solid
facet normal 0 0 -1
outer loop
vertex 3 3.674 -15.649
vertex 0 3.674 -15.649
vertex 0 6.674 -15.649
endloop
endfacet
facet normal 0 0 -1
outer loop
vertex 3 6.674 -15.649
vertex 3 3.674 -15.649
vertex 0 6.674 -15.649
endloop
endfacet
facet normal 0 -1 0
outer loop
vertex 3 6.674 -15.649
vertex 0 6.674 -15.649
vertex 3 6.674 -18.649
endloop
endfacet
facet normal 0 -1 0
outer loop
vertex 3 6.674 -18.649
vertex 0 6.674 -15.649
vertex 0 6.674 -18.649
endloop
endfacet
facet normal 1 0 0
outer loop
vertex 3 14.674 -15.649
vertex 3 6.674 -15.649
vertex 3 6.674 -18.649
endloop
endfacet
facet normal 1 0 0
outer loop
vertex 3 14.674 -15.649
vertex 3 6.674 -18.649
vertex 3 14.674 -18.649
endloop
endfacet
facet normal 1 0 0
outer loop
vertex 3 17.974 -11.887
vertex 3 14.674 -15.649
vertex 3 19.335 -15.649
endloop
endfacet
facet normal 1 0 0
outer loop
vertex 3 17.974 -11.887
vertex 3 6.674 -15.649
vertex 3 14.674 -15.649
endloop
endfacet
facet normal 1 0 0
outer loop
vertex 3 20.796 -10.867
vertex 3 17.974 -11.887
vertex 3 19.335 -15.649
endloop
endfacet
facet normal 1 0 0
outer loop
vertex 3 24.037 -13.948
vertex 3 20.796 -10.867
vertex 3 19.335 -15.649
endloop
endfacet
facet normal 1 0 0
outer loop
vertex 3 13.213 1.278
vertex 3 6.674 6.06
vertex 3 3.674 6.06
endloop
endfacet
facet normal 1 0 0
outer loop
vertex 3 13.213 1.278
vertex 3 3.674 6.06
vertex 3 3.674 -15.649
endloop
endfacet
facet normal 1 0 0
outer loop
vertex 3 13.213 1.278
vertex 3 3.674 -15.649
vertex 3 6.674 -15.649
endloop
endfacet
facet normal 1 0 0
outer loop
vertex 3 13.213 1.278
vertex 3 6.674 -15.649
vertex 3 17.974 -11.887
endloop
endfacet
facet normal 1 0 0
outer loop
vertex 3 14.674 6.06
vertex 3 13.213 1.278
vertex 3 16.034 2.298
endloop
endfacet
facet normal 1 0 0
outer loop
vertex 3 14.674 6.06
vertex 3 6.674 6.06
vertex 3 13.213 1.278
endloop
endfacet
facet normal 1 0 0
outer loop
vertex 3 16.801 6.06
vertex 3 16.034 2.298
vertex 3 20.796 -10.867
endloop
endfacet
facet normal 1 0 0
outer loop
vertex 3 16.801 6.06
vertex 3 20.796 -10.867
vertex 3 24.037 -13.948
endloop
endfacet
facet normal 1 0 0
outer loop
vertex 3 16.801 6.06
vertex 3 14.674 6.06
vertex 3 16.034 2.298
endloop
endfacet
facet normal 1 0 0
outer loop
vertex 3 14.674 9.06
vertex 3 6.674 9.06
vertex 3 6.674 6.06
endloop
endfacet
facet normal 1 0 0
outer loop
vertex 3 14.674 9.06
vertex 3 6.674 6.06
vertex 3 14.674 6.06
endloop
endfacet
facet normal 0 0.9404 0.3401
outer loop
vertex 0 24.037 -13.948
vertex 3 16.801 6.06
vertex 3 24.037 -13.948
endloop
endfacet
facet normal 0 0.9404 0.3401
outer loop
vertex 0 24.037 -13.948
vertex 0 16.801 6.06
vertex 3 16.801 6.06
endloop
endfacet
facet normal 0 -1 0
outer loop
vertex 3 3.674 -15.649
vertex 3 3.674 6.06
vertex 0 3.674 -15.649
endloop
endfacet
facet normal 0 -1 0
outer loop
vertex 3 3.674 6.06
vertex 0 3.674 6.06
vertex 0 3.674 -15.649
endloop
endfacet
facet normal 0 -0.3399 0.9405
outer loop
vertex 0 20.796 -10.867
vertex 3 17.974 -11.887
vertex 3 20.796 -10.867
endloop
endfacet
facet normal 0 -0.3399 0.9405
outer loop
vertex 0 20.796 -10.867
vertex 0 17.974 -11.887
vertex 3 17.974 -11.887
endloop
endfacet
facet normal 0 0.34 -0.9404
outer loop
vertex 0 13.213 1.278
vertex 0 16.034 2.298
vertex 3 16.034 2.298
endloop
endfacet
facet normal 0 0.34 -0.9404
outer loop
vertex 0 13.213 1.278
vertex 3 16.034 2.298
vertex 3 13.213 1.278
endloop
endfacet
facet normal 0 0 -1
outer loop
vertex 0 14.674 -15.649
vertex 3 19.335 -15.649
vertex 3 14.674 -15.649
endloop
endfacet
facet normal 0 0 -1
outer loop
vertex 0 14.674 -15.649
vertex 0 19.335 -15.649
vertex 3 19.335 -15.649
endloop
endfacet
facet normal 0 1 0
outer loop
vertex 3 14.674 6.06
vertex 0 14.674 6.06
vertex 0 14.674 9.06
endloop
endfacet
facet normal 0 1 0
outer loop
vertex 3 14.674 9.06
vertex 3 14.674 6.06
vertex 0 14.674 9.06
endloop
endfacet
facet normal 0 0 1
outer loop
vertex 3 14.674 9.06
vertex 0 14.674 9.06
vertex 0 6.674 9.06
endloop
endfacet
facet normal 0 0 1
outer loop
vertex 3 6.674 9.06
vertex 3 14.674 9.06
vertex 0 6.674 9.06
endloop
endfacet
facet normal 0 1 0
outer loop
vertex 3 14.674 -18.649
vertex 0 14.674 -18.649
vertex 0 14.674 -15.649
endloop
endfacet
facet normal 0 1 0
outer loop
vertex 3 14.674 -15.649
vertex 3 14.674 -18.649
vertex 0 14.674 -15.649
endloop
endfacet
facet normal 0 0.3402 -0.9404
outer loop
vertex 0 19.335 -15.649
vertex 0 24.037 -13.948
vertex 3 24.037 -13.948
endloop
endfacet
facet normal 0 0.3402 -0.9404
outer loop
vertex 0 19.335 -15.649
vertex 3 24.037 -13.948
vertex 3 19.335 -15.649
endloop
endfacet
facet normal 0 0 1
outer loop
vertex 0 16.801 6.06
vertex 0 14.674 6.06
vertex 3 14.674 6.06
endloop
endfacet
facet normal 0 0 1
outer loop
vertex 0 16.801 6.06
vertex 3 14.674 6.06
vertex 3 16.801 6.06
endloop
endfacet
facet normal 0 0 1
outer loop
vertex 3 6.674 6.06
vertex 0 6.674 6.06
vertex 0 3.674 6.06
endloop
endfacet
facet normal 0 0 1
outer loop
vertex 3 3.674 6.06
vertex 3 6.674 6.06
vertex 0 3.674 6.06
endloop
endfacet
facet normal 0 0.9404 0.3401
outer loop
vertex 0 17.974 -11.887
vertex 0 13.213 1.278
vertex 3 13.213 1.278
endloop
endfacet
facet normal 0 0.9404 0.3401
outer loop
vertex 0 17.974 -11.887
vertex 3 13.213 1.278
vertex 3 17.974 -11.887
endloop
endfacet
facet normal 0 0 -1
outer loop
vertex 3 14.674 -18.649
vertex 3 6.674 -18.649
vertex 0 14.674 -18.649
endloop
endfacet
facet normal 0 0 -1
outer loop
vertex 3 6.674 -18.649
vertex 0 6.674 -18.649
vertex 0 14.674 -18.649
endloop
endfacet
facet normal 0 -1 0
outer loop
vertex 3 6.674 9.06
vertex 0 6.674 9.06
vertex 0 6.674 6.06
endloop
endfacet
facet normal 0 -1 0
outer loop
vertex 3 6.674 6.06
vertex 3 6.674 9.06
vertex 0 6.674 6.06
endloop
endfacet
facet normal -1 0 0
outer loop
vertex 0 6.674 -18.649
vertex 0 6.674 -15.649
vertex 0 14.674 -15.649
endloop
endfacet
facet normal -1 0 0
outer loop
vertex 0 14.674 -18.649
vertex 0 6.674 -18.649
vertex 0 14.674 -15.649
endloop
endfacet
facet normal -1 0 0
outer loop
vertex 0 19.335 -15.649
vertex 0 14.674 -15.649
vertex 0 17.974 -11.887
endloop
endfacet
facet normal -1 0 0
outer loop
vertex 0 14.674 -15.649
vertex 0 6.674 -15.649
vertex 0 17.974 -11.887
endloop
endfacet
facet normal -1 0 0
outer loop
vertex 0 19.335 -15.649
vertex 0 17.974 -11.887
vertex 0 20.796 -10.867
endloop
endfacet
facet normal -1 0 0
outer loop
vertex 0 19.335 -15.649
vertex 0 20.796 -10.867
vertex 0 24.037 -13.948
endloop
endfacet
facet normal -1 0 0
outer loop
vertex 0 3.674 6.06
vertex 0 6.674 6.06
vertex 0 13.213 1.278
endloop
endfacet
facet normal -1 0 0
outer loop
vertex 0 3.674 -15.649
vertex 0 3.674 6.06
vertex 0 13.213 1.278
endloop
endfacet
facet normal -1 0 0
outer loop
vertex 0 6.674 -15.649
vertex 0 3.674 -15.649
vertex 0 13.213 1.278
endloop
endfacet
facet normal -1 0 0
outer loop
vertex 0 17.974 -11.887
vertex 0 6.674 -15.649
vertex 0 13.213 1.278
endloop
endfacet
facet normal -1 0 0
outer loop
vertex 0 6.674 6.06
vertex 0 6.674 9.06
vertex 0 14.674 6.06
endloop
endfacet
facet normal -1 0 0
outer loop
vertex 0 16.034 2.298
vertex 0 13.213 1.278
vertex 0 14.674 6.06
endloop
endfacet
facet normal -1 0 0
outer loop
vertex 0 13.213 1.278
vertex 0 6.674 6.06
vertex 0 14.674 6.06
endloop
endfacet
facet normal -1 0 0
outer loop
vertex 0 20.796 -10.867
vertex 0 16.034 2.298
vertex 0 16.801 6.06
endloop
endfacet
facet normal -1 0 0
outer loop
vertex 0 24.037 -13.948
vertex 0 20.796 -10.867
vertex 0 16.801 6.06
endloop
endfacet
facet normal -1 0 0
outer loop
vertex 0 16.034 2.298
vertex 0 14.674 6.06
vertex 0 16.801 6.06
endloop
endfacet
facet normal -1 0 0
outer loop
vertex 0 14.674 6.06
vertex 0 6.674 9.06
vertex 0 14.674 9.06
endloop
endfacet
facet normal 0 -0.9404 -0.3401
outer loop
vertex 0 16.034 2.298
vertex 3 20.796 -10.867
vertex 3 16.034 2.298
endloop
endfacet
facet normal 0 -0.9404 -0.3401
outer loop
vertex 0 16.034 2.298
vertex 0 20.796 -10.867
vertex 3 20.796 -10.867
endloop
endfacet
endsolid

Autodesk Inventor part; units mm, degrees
ref_plane "YZ Plane" through (0, 0, 0) normal (1, 0, 0) x (0, 1, 0)
ref_plane "XZ Plane" through (0, 0, 0) normal (0, 1, 0) x (-1, 0, 0)
ref_plane "XY Plane" through (0, 0, 0) normal (0, 0, 1) x (1, 0, 0)
sketch "Sketch2" plane through (0, 0, 0) normal (1, 0, 0) x (0, 1, 0)
  line L0 (16.0342, 2.2983) -> (13.213, 1.278)
  line L1 (13.213, 1.278) -> (17.9745, -11.8874)
  line L2 (17.9745, -11.8874) -> (20.7956, -10.8671)
  line L3 (20.7956, -10.8671) -> (16.0342, 2.2983)
  line L4 (16.8006, 6.0599) -> (24.0368, -13.9485)
  line L5 (14.6738, 6.0599) -> (16.8006, 6.0599)
  line L6 (24.0368, -13.9485) -> (19.3349, -15.649)
  line L7 (19.3349, -15.649) -> (14.6738, -15.649)
  line L8 (22.156, -14.6287) -> (14.6738, 6.0599) construction
  line L9 (17.9745, -11.8874) -> (11.3917, -14.2681) construction
  line L10 (11.3917, -14.2681) -> (6.6303, -1.1027) construction
  line L11 (6.6303, -1.1027) -> (13.213, 1.278) construction
  line L12 (6.6738, 6.0599) -> (3.6738, 6.0599)
  line L13 (3.6738, 6.0599) -> (3.6738, -15.649)
  line L14 (3.6738, -15.649) -> (6.6738, -15.649)
  line L15 (14.6738, 6.0599) -> (14.6738, 9.0599)
  line L16 (14.6738, 9.0599) -> (6.6738, 9.0599)
  line L17 (6.6738, 9.0599) -> (6.6738, 6.0599)
  line L18 (6.6738, -15.649) -> (6.6738, -18.649)
  line L19 (6.6738, -18.649) -> (14.6738, -18.649)
  line L20 (14.6738, -18.649) -> (14.6738, -15.649)
  point P0 (0, 0)
  dimension "d9" = 5
  dimension "d11" = 2
  dimension "d13" = 4
  dimension "d14" = 4
  dimension "d15" = 14
  dimension "d16" = 7
  dimension "d17" = 3
  dimension "d18" = 3
  dimension "d21" = 3
  dimension "d22" = 3
  dimension "d27" = 21.7089
  dimension "d28" = 8
  dimension "d29" = 8
extrude "Extrusion1" add sketch "Sketch2" along normal blind 3
equation "\"d13\" = d14"
properties part number "k_thumb_profile"
